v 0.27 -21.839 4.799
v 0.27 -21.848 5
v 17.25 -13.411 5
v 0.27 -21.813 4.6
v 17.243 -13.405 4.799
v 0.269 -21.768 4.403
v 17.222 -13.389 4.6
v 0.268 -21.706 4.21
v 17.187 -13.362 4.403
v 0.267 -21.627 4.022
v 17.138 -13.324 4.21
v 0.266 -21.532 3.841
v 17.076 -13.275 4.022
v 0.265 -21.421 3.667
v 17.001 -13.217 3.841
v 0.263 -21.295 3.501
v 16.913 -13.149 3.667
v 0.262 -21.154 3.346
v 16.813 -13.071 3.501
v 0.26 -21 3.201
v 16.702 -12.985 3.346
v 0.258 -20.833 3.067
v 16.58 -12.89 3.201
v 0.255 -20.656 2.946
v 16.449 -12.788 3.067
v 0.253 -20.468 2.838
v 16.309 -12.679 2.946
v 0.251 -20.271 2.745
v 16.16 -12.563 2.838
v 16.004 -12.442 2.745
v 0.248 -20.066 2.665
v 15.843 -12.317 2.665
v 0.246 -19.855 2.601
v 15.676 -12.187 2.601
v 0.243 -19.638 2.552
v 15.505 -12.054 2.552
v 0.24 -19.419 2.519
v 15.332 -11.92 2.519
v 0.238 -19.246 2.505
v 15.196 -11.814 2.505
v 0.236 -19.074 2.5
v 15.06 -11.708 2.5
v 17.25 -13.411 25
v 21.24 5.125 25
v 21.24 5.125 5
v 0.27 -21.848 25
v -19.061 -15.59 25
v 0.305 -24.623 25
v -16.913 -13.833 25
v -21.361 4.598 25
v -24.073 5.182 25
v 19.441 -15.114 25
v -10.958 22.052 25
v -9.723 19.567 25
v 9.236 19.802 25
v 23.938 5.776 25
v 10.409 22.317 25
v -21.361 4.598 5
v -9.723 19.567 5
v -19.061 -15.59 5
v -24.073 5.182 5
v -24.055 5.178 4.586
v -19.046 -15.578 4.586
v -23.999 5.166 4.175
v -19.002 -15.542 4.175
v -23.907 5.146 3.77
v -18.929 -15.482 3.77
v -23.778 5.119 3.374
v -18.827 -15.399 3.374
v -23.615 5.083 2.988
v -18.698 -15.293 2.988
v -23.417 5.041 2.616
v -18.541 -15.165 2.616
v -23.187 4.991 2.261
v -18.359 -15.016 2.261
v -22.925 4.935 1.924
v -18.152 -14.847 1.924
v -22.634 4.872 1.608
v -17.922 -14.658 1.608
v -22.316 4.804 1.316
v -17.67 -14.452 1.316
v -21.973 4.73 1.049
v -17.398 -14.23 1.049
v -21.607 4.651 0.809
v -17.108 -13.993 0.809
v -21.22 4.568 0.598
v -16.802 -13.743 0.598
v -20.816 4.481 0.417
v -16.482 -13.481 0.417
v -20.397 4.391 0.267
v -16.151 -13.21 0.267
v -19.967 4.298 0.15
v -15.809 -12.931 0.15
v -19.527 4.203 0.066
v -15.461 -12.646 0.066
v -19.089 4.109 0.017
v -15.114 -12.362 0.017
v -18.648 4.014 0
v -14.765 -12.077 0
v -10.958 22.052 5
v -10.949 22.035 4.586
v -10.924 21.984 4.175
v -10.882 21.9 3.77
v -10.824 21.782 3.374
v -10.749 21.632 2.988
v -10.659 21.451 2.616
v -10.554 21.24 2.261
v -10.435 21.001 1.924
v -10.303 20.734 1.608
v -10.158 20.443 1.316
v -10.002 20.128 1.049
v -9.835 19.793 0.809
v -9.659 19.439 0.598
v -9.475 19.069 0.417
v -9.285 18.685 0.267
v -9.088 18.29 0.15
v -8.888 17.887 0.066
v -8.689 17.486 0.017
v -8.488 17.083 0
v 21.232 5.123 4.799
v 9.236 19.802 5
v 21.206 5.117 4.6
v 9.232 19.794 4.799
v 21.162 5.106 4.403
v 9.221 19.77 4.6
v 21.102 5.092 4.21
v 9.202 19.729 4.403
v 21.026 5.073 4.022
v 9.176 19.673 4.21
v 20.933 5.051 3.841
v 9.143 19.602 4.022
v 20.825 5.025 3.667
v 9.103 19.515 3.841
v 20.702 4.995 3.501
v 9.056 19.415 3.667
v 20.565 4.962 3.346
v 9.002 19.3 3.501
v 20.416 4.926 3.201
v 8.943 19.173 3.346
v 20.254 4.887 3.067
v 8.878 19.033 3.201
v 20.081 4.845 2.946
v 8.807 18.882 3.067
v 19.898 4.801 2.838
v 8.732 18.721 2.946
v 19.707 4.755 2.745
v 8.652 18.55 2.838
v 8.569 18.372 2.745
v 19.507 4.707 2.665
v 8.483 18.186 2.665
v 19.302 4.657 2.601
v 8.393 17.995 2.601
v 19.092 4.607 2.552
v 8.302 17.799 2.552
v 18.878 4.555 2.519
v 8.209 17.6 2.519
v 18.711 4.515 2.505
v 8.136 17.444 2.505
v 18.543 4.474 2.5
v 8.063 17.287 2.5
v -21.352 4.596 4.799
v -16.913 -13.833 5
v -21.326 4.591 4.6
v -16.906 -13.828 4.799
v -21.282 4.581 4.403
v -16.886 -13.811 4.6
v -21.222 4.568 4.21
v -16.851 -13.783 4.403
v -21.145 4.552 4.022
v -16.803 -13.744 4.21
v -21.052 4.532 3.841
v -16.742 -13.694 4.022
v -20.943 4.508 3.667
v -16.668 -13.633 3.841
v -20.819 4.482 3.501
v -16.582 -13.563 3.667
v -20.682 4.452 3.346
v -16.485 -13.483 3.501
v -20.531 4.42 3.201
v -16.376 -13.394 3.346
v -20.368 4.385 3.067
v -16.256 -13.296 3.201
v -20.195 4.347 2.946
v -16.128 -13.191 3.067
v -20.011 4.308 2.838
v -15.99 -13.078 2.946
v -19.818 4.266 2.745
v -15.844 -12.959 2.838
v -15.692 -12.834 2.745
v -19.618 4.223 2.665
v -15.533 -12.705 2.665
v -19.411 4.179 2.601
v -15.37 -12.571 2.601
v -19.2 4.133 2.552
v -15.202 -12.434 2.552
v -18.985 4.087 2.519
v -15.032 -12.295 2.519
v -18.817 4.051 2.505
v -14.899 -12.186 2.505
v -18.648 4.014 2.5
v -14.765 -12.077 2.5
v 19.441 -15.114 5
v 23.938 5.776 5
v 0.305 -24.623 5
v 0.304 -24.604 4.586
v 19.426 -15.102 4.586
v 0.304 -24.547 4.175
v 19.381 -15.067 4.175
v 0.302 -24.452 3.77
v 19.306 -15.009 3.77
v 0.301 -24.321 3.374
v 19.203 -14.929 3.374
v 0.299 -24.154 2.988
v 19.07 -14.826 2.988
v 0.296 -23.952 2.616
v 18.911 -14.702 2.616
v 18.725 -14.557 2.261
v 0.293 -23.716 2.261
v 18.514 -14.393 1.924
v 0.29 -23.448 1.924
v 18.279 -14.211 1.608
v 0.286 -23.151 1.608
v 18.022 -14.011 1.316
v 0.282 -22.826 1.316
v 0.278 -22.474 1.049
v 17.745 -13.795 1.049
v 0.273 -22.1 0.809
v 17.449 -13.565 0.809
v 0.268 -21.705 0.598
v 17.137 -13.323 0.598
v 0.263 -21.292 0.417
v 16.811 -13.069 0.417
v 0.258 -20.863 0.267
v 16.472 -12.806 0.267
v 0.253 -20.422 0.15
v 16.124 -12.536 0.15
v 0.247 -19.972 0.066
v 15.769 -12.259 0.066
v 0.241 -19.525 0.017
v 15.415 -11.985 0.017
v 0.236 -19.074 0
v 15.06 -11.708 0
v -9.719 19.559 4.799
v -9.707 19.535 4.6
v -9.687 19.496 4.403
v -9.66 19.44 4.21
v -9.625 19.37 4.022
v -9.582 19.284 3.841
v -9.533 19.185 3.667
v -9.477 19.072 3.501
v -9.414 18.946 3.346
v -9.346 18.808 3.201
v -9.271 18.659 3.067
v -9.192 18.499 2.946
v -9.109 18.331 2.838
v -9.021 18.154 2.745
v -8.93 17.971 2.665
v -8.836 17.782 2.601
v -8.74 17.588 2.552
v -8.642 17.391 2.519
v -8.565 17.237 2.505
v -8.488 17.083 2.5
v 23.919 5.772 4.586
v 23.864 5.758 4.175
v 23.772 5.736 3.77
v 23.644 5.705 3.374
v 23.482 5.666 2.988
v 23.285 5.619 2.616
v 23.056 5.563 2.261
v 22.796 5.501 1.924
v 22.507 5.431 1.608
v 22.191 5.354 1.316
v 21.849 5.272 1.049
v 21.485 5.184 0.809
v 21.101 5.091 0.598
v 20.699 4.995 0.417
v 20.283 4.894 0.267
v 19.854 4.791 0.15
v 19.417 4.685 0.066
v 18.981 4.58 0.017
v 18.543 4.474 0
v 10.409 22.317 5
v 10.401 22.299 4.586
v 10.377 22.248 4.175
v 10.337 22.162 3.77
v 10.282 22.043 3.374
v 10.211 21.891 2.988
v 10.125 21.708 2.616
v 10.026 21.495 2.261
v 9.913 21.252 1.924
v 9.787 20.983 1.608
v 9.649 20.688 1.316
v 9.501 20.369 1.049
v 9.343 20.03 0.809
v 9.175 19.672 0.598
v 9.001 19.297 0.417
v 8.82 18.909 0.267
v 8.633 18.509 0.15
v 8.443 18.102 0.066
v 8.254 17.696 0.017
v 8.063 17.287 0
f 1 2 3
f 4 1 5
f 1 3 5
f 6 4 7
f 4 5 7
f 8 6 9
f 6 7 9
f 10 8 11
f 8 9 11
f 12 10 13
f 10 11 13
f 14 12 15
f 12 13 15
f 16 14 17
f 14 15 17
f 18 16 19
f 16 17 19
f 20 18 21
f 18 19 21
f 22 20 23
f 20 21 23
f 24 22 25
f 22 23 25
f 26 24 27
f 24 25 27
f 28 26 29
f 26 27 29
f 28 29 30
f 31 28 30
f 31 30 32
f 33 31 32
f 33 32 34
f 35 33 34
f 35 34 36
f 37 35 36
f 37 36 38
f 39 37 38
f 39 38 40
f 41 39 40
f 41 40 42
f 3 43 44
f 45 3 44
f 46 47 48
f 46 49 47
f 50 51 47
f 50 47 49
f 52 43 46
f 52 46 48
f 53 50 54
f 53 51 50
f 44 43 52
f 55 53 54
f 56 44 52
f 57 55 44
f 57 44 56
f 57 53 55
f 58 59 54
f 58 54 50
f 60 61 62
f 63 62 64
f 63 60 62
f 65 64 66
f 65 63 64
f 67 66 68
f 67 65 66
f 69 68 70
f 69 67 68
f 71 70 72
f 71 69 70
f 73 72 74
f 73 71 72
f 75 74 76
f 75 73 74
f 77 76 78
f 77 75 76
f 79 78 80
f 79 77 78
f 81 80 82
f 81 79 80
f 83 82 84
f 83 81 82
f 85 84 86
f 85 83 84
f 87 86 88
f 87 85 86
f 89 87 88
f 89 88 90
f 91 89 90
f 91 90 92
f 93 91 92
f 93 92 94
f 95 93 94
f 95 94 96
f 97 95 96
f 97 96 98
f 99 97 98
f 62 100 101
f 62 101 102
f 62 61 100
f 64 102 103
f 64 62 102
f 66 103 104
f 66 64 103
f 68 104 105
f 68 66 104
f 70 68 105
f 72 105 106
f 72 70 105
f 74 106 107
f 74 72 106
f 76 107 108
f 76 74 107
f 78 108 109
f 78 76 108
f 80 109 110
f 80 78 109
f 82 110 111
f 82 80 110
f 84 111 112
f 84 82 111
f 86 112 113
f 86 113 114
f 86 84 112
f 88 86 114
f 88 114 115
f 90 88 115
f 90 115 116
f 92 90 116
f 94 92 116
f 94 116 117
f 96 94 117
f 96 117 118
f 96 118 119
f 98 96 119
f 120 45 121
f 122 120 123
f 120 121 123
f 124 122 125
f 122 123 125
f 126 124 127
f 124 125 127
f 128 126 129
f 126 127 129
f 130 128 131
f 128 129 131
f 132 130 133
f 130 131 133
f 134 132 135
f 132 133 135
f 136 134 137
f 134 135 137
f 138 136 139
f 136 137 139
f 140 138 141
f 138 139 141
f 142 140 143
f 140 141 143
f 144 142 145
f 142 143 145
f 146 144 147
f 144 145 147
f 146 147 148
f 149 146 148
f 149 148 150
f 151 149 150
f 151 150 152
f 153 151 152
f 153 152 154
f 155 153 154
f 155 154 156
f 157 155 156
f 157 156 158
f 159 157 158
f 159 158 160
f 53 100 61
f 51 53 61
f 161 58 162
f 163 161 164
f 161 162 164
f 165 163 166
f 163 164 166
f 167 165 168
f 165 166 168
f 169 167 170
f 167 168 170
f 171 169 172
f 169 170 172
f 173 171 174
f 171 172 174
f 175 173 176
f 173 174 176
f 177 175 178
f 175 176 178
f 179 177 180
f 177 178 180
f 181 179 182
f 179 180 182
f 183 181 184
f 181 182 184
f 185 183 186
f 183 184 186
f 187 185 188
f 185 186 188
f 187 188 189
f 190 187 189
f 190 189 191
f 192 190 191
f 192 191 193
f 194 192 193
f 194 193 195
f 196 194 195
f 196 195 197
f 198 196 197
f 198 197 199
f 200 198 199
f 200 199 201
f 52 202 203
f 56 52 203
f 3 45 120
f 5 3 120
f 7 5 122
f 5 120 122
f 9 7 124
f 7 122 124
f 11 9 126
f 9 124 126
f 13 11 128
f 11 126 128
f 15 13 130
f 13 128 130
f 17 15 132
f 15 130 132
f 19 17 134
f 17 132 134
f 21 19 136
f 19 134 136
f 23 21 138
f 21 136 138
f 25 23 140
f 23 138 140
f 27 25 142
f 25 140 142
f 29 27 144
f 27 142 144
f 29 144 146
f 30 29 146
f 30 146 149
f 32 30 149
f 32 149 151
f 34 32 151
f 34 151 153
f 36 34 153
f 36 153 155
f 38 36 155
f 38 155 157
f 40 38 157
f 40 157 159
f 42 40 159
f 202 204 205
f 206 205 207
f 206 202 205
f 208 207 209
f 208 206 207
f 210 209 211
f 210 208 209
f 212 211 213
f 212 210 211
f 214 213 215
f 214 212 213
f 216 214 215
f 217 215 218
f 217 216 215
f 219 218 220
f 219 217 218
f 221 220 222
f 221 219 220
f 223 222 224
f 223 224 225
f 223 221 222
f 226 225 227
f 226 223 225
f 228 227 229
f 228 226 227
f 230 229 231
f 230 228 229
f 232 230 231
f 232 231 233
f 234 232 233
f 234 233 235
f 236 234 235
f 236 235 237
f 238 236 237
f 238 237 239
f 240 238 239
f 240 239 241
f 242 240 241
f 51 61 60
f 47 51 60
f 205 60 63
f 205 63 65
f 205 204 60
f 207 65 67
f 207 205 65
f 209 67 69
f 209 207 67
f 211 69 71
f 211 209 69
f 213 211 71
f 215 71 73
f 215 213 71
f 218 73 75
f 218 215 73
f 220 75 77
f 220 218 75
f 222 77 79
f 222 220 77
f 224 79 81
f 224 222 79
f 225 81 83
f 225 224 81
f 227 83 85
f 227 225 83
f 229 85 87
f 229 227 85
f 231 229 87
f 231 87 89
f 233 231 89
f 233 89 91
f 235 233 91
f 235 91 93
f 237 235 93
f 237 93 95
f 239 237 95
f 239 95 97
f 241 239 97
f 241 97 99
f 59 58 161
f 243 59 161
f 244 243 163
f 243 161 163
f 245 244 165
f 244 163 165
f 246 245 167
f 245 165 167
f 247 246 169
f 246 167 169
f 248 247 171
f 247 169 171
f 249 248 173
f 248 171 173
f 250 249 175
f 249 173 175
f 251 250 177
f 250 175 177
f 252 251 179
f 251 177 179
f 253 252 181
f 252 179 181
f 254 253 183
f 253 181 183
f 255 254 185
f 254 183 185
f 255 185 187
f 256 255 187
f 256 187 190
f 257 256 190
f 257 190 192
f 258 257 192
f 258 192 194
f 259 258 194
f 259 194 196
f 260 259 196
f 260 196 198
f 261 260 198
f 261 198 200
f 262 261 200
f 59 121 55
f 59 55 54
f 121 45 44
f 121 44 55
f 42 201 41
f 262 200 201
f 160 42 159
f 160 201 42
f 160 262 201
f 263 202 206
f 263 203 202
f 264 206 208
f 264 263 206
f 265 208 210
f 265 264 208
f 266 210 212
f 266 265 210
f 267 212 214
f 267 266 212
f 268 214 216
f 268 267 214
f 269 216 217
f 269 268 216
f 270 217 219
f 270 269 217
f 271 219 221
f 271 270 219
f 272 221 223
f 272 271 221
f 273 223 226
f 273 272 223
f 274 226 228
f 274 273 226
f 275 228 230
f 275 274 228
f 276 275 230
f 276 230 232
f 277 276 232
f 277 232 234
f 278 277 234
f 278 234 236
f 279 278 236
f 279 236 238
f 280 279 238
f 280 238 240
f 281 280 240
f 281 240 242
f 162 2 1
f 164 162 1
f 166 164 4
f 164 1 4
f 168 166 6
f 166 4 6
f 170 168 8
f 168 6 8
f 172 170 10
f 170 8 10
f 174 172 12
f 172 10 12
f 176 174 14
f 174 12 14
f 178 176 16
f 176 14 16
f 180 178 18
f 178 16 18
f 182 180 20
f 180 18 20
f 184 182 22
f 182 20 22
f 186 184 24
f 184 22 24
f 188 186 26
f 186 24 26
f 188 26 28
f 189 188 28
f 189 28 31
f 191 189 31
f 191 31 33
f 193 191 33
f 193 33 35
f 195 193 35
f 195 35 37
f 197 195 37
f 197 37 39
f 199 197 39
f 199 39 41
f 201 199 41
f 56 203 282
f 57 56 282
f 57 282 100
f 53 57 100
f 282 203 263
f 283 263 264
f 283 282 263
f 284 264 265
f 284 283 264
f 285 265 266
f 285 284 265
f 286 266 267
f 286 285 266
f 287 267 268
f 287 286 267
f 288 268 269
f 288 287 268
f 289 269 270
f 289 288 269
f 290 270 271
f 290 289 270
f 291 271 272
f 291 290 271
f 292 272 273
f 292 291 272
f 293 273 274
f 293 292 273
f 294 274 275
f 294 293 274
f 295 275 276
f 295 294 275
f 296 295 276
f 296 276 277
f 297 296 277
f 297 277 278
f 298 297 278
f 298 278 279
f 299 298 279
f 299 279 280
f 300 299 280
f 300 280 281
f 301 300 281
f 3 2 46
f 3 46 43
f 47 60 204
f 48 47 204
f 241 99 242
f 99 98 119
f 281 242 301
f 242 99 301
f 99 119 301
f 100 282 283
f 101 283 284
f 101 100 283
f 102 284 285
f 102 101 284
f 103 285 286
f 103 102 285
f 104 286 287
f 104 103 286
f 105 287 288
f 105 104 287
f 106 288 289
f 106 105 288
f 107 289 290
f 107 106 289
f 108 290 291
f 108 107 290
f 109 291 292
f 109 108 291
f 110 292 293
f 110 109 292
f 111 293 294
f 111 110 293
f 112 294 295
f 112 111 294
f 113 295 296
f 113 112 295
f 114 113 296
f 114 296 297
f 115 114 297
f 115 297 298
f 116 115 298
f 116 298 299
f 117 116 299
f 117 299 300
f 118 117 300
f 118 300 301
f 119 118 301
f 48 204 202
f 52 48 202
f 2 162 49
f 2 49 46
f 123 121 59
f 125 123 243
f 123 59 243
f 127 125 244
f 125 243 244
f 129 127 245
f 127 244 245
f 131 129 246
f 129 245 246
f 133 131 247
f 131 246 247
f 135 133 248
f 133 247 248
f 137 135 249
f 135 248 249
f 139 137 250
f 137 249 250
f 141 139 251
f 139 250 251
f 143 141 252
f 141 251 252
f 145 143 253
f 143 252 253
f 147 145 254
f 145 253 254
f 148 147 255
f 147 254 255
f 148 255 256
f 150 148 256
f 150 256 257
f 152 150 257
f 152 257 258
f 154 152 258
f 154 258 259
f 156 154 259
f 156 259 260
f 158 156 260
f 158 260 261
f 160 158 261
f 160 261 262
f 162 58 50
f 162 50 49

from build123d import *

# Parameters (mm, degrees)
F1_DEPTH = 25
F2_R     = 5
F3_T     = -2.5


with BuildPart() as f1:
    # F0 (on Top) → F1 (new body)
    with BuildSketch(Plane.XY):
        Polygon((19.44085, -15.114036), (23.937801, 5.776022), (10.409099, 22.316617), (-10.957867, 22.052344), (-24.073335, 5.182207), (-19.061091, -15.590238), (0.304543, -24.622916), align=None)
    extrude(amount=F1_DEPTH)

    # F2
    f2_edges = [f1.edges().sort_by_distance(p)[0] for p in [
        (21.689326, -4.669007, 0),
        (17.17345, 14.046319, 0),
        (-0.274384, 22.184481, 0),
        (-17.515601, 13.617276, 0),
        (-21.567213, -5.204016, 0),
        (-9.378274, -20.106577, 0),
        (9.872697, -19.868476, 0),
    ]]
    fillet(f2_edges, radius=F2_R)

    # F3
    f3_openings = [f1.faces().sort_by_distance(p)[0] for p in [
        (0, 0, 25),
    ]]
    offset(amount=F3_T, openings=f3_openings)


solid = f1.part
